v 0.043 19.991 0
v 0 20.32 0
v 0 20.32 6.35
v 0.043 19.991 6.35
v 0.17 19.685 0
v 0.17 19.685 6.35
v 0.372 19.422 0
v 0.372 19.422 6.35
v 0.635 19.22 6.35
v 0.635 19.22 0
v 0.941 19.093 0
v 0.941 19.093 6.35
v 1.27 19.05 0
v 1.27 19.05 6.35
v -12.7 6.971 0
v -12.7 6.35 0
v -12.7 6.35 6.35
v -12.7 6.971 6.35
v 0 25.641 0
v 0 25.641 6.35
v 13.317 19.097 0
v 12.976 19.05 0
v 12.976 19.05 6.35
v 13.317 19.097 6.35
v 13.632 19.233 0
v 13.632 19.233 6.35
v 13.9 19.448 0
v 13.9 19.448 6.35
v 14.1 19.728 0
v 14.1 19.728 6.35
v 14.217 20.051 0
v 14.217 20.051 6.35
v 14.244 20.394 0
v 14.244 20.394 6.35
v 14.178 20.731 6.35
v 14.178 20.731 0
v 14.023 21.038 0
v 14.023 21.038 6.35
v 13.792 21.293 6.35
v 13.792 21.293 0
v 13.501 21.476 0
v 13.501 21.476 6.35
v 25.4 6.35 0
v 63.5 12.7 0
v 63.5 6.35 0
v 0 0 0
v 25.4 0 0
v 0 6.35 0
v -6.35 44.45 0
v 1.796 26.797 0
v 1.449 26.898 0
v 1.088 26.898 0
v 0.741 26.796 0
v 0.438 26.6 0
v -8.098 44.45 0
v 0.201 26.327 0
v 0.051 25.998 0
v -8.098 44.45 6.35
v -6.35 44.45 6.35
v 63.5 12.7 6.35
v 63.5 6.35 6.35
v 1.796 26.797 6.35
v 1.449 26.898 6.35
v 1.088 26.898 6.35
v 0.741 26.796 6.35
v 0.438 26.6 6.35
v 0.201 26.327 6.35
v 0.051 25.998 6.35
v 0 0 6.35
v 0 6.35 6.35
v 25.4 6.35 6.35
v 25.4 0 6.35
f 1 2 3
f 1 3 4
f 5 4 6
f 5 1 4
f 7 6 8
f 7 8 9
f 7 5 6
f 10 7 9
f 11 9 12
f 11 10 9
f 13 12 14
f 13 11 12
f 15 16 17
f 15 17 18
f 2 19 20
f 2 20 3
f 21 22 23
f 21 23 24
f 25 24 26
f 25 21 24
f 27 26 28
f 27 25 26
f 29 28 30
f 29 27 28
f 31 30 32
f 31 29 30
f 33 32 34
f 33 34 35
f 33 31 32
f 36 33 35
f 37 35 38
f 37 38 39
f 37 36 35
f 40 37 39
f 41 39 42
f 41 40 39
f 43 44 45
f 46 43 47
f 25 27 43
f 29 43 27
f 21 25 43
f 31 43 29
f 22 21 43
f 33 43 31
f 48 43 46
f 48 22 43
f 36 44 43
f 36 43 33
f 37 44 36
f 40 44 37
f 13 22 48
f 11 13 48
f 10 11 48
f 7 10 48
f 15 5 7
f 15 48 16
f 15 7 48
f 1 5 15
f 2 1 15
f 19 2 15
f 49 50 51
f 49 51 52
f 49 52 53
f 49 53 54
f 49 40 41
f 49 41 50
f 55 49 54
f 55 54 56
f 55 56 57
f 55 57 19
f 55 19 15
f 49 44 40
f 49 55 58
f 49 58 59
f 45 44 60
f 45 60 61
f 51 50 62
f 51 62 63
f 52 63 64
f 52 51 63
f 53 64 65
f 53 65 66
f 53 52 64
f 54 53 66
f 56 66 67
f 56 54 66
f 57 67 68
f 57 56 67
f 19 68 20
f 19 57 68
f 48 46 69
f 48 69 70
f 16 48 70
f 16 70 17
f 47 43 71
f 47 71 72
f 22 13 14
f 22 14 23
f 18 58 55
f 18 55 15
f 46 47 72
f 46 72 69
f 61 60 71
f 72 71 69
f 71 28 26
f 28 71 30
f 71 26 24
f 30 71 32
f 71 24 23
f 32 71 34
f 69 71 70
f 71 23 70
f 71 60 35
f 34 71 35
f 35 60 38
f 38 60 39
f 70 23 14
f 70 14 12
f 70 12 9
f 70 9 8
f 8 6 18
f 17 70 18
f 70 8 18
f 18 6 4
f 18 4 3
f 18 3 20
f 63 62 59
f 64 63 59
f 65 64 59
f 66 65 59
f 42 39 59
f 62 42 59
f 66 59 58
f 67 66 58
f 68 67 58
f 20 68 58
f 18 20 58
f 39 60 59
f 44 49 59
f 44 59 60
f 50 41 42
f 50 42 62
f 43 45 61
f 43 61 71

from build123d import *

# Parameters (mm, degrees)
BOSS_EXTRUDE1_DEPTH = 6.35
CUT_EXTRUDE1_DEPTH  = 78.771299333


with BuildPart() as part:
    # Sketch2 → Boss-Extrude1 (new body)
    with BuildSketch(Plane.XY):
        Polygon((0, 0), (0, 6.35), (-12.7, 6.35), (-12.7, 44.45), (-6.35, 44.45), (63.5, 12.7), (63.5, 6.35), (25.4, 6.35), (25.4, 0), align=None)
        with BuildLine():
            Line((0, 25.64089525), (0, 20.32))
            ThreePointArc((0, 20.32), (0.371974388, 19.421974388), (1.27, 19.05))
            Line((1.27, 19.05), (12.97596955, 19.05))
            ThreePointArc((12.97596955, 19.05), (14.217184699, 20.051141386), (13.501499289, 21.476165426))
            Line((13.501499289, 21.476165426), (1.795529739, 26.797060676))
            ThreePointArc((1.795529739, 26.797060676), (0.5824401, 26.708678648), (0, 25.64089525))
        make_face(mode=Mode.SUBTRACT)
    extrude(amount=BOSS_EXTRUDE1_DEPTH)

    # Sketch3 → Cut-Extrude1 (cut, through all)
    with BuildSketch(Plane.XY.offset(6.35)):
        Polygon((-8.09810823, 44.45), (-12.7, 6.970599198), (-12.7, 44.45), align=None)
    extrude(amount=-CUT_EXTRUDE1_DEPTH, mode=Mode.SUBTRACT)


solid = part.part
